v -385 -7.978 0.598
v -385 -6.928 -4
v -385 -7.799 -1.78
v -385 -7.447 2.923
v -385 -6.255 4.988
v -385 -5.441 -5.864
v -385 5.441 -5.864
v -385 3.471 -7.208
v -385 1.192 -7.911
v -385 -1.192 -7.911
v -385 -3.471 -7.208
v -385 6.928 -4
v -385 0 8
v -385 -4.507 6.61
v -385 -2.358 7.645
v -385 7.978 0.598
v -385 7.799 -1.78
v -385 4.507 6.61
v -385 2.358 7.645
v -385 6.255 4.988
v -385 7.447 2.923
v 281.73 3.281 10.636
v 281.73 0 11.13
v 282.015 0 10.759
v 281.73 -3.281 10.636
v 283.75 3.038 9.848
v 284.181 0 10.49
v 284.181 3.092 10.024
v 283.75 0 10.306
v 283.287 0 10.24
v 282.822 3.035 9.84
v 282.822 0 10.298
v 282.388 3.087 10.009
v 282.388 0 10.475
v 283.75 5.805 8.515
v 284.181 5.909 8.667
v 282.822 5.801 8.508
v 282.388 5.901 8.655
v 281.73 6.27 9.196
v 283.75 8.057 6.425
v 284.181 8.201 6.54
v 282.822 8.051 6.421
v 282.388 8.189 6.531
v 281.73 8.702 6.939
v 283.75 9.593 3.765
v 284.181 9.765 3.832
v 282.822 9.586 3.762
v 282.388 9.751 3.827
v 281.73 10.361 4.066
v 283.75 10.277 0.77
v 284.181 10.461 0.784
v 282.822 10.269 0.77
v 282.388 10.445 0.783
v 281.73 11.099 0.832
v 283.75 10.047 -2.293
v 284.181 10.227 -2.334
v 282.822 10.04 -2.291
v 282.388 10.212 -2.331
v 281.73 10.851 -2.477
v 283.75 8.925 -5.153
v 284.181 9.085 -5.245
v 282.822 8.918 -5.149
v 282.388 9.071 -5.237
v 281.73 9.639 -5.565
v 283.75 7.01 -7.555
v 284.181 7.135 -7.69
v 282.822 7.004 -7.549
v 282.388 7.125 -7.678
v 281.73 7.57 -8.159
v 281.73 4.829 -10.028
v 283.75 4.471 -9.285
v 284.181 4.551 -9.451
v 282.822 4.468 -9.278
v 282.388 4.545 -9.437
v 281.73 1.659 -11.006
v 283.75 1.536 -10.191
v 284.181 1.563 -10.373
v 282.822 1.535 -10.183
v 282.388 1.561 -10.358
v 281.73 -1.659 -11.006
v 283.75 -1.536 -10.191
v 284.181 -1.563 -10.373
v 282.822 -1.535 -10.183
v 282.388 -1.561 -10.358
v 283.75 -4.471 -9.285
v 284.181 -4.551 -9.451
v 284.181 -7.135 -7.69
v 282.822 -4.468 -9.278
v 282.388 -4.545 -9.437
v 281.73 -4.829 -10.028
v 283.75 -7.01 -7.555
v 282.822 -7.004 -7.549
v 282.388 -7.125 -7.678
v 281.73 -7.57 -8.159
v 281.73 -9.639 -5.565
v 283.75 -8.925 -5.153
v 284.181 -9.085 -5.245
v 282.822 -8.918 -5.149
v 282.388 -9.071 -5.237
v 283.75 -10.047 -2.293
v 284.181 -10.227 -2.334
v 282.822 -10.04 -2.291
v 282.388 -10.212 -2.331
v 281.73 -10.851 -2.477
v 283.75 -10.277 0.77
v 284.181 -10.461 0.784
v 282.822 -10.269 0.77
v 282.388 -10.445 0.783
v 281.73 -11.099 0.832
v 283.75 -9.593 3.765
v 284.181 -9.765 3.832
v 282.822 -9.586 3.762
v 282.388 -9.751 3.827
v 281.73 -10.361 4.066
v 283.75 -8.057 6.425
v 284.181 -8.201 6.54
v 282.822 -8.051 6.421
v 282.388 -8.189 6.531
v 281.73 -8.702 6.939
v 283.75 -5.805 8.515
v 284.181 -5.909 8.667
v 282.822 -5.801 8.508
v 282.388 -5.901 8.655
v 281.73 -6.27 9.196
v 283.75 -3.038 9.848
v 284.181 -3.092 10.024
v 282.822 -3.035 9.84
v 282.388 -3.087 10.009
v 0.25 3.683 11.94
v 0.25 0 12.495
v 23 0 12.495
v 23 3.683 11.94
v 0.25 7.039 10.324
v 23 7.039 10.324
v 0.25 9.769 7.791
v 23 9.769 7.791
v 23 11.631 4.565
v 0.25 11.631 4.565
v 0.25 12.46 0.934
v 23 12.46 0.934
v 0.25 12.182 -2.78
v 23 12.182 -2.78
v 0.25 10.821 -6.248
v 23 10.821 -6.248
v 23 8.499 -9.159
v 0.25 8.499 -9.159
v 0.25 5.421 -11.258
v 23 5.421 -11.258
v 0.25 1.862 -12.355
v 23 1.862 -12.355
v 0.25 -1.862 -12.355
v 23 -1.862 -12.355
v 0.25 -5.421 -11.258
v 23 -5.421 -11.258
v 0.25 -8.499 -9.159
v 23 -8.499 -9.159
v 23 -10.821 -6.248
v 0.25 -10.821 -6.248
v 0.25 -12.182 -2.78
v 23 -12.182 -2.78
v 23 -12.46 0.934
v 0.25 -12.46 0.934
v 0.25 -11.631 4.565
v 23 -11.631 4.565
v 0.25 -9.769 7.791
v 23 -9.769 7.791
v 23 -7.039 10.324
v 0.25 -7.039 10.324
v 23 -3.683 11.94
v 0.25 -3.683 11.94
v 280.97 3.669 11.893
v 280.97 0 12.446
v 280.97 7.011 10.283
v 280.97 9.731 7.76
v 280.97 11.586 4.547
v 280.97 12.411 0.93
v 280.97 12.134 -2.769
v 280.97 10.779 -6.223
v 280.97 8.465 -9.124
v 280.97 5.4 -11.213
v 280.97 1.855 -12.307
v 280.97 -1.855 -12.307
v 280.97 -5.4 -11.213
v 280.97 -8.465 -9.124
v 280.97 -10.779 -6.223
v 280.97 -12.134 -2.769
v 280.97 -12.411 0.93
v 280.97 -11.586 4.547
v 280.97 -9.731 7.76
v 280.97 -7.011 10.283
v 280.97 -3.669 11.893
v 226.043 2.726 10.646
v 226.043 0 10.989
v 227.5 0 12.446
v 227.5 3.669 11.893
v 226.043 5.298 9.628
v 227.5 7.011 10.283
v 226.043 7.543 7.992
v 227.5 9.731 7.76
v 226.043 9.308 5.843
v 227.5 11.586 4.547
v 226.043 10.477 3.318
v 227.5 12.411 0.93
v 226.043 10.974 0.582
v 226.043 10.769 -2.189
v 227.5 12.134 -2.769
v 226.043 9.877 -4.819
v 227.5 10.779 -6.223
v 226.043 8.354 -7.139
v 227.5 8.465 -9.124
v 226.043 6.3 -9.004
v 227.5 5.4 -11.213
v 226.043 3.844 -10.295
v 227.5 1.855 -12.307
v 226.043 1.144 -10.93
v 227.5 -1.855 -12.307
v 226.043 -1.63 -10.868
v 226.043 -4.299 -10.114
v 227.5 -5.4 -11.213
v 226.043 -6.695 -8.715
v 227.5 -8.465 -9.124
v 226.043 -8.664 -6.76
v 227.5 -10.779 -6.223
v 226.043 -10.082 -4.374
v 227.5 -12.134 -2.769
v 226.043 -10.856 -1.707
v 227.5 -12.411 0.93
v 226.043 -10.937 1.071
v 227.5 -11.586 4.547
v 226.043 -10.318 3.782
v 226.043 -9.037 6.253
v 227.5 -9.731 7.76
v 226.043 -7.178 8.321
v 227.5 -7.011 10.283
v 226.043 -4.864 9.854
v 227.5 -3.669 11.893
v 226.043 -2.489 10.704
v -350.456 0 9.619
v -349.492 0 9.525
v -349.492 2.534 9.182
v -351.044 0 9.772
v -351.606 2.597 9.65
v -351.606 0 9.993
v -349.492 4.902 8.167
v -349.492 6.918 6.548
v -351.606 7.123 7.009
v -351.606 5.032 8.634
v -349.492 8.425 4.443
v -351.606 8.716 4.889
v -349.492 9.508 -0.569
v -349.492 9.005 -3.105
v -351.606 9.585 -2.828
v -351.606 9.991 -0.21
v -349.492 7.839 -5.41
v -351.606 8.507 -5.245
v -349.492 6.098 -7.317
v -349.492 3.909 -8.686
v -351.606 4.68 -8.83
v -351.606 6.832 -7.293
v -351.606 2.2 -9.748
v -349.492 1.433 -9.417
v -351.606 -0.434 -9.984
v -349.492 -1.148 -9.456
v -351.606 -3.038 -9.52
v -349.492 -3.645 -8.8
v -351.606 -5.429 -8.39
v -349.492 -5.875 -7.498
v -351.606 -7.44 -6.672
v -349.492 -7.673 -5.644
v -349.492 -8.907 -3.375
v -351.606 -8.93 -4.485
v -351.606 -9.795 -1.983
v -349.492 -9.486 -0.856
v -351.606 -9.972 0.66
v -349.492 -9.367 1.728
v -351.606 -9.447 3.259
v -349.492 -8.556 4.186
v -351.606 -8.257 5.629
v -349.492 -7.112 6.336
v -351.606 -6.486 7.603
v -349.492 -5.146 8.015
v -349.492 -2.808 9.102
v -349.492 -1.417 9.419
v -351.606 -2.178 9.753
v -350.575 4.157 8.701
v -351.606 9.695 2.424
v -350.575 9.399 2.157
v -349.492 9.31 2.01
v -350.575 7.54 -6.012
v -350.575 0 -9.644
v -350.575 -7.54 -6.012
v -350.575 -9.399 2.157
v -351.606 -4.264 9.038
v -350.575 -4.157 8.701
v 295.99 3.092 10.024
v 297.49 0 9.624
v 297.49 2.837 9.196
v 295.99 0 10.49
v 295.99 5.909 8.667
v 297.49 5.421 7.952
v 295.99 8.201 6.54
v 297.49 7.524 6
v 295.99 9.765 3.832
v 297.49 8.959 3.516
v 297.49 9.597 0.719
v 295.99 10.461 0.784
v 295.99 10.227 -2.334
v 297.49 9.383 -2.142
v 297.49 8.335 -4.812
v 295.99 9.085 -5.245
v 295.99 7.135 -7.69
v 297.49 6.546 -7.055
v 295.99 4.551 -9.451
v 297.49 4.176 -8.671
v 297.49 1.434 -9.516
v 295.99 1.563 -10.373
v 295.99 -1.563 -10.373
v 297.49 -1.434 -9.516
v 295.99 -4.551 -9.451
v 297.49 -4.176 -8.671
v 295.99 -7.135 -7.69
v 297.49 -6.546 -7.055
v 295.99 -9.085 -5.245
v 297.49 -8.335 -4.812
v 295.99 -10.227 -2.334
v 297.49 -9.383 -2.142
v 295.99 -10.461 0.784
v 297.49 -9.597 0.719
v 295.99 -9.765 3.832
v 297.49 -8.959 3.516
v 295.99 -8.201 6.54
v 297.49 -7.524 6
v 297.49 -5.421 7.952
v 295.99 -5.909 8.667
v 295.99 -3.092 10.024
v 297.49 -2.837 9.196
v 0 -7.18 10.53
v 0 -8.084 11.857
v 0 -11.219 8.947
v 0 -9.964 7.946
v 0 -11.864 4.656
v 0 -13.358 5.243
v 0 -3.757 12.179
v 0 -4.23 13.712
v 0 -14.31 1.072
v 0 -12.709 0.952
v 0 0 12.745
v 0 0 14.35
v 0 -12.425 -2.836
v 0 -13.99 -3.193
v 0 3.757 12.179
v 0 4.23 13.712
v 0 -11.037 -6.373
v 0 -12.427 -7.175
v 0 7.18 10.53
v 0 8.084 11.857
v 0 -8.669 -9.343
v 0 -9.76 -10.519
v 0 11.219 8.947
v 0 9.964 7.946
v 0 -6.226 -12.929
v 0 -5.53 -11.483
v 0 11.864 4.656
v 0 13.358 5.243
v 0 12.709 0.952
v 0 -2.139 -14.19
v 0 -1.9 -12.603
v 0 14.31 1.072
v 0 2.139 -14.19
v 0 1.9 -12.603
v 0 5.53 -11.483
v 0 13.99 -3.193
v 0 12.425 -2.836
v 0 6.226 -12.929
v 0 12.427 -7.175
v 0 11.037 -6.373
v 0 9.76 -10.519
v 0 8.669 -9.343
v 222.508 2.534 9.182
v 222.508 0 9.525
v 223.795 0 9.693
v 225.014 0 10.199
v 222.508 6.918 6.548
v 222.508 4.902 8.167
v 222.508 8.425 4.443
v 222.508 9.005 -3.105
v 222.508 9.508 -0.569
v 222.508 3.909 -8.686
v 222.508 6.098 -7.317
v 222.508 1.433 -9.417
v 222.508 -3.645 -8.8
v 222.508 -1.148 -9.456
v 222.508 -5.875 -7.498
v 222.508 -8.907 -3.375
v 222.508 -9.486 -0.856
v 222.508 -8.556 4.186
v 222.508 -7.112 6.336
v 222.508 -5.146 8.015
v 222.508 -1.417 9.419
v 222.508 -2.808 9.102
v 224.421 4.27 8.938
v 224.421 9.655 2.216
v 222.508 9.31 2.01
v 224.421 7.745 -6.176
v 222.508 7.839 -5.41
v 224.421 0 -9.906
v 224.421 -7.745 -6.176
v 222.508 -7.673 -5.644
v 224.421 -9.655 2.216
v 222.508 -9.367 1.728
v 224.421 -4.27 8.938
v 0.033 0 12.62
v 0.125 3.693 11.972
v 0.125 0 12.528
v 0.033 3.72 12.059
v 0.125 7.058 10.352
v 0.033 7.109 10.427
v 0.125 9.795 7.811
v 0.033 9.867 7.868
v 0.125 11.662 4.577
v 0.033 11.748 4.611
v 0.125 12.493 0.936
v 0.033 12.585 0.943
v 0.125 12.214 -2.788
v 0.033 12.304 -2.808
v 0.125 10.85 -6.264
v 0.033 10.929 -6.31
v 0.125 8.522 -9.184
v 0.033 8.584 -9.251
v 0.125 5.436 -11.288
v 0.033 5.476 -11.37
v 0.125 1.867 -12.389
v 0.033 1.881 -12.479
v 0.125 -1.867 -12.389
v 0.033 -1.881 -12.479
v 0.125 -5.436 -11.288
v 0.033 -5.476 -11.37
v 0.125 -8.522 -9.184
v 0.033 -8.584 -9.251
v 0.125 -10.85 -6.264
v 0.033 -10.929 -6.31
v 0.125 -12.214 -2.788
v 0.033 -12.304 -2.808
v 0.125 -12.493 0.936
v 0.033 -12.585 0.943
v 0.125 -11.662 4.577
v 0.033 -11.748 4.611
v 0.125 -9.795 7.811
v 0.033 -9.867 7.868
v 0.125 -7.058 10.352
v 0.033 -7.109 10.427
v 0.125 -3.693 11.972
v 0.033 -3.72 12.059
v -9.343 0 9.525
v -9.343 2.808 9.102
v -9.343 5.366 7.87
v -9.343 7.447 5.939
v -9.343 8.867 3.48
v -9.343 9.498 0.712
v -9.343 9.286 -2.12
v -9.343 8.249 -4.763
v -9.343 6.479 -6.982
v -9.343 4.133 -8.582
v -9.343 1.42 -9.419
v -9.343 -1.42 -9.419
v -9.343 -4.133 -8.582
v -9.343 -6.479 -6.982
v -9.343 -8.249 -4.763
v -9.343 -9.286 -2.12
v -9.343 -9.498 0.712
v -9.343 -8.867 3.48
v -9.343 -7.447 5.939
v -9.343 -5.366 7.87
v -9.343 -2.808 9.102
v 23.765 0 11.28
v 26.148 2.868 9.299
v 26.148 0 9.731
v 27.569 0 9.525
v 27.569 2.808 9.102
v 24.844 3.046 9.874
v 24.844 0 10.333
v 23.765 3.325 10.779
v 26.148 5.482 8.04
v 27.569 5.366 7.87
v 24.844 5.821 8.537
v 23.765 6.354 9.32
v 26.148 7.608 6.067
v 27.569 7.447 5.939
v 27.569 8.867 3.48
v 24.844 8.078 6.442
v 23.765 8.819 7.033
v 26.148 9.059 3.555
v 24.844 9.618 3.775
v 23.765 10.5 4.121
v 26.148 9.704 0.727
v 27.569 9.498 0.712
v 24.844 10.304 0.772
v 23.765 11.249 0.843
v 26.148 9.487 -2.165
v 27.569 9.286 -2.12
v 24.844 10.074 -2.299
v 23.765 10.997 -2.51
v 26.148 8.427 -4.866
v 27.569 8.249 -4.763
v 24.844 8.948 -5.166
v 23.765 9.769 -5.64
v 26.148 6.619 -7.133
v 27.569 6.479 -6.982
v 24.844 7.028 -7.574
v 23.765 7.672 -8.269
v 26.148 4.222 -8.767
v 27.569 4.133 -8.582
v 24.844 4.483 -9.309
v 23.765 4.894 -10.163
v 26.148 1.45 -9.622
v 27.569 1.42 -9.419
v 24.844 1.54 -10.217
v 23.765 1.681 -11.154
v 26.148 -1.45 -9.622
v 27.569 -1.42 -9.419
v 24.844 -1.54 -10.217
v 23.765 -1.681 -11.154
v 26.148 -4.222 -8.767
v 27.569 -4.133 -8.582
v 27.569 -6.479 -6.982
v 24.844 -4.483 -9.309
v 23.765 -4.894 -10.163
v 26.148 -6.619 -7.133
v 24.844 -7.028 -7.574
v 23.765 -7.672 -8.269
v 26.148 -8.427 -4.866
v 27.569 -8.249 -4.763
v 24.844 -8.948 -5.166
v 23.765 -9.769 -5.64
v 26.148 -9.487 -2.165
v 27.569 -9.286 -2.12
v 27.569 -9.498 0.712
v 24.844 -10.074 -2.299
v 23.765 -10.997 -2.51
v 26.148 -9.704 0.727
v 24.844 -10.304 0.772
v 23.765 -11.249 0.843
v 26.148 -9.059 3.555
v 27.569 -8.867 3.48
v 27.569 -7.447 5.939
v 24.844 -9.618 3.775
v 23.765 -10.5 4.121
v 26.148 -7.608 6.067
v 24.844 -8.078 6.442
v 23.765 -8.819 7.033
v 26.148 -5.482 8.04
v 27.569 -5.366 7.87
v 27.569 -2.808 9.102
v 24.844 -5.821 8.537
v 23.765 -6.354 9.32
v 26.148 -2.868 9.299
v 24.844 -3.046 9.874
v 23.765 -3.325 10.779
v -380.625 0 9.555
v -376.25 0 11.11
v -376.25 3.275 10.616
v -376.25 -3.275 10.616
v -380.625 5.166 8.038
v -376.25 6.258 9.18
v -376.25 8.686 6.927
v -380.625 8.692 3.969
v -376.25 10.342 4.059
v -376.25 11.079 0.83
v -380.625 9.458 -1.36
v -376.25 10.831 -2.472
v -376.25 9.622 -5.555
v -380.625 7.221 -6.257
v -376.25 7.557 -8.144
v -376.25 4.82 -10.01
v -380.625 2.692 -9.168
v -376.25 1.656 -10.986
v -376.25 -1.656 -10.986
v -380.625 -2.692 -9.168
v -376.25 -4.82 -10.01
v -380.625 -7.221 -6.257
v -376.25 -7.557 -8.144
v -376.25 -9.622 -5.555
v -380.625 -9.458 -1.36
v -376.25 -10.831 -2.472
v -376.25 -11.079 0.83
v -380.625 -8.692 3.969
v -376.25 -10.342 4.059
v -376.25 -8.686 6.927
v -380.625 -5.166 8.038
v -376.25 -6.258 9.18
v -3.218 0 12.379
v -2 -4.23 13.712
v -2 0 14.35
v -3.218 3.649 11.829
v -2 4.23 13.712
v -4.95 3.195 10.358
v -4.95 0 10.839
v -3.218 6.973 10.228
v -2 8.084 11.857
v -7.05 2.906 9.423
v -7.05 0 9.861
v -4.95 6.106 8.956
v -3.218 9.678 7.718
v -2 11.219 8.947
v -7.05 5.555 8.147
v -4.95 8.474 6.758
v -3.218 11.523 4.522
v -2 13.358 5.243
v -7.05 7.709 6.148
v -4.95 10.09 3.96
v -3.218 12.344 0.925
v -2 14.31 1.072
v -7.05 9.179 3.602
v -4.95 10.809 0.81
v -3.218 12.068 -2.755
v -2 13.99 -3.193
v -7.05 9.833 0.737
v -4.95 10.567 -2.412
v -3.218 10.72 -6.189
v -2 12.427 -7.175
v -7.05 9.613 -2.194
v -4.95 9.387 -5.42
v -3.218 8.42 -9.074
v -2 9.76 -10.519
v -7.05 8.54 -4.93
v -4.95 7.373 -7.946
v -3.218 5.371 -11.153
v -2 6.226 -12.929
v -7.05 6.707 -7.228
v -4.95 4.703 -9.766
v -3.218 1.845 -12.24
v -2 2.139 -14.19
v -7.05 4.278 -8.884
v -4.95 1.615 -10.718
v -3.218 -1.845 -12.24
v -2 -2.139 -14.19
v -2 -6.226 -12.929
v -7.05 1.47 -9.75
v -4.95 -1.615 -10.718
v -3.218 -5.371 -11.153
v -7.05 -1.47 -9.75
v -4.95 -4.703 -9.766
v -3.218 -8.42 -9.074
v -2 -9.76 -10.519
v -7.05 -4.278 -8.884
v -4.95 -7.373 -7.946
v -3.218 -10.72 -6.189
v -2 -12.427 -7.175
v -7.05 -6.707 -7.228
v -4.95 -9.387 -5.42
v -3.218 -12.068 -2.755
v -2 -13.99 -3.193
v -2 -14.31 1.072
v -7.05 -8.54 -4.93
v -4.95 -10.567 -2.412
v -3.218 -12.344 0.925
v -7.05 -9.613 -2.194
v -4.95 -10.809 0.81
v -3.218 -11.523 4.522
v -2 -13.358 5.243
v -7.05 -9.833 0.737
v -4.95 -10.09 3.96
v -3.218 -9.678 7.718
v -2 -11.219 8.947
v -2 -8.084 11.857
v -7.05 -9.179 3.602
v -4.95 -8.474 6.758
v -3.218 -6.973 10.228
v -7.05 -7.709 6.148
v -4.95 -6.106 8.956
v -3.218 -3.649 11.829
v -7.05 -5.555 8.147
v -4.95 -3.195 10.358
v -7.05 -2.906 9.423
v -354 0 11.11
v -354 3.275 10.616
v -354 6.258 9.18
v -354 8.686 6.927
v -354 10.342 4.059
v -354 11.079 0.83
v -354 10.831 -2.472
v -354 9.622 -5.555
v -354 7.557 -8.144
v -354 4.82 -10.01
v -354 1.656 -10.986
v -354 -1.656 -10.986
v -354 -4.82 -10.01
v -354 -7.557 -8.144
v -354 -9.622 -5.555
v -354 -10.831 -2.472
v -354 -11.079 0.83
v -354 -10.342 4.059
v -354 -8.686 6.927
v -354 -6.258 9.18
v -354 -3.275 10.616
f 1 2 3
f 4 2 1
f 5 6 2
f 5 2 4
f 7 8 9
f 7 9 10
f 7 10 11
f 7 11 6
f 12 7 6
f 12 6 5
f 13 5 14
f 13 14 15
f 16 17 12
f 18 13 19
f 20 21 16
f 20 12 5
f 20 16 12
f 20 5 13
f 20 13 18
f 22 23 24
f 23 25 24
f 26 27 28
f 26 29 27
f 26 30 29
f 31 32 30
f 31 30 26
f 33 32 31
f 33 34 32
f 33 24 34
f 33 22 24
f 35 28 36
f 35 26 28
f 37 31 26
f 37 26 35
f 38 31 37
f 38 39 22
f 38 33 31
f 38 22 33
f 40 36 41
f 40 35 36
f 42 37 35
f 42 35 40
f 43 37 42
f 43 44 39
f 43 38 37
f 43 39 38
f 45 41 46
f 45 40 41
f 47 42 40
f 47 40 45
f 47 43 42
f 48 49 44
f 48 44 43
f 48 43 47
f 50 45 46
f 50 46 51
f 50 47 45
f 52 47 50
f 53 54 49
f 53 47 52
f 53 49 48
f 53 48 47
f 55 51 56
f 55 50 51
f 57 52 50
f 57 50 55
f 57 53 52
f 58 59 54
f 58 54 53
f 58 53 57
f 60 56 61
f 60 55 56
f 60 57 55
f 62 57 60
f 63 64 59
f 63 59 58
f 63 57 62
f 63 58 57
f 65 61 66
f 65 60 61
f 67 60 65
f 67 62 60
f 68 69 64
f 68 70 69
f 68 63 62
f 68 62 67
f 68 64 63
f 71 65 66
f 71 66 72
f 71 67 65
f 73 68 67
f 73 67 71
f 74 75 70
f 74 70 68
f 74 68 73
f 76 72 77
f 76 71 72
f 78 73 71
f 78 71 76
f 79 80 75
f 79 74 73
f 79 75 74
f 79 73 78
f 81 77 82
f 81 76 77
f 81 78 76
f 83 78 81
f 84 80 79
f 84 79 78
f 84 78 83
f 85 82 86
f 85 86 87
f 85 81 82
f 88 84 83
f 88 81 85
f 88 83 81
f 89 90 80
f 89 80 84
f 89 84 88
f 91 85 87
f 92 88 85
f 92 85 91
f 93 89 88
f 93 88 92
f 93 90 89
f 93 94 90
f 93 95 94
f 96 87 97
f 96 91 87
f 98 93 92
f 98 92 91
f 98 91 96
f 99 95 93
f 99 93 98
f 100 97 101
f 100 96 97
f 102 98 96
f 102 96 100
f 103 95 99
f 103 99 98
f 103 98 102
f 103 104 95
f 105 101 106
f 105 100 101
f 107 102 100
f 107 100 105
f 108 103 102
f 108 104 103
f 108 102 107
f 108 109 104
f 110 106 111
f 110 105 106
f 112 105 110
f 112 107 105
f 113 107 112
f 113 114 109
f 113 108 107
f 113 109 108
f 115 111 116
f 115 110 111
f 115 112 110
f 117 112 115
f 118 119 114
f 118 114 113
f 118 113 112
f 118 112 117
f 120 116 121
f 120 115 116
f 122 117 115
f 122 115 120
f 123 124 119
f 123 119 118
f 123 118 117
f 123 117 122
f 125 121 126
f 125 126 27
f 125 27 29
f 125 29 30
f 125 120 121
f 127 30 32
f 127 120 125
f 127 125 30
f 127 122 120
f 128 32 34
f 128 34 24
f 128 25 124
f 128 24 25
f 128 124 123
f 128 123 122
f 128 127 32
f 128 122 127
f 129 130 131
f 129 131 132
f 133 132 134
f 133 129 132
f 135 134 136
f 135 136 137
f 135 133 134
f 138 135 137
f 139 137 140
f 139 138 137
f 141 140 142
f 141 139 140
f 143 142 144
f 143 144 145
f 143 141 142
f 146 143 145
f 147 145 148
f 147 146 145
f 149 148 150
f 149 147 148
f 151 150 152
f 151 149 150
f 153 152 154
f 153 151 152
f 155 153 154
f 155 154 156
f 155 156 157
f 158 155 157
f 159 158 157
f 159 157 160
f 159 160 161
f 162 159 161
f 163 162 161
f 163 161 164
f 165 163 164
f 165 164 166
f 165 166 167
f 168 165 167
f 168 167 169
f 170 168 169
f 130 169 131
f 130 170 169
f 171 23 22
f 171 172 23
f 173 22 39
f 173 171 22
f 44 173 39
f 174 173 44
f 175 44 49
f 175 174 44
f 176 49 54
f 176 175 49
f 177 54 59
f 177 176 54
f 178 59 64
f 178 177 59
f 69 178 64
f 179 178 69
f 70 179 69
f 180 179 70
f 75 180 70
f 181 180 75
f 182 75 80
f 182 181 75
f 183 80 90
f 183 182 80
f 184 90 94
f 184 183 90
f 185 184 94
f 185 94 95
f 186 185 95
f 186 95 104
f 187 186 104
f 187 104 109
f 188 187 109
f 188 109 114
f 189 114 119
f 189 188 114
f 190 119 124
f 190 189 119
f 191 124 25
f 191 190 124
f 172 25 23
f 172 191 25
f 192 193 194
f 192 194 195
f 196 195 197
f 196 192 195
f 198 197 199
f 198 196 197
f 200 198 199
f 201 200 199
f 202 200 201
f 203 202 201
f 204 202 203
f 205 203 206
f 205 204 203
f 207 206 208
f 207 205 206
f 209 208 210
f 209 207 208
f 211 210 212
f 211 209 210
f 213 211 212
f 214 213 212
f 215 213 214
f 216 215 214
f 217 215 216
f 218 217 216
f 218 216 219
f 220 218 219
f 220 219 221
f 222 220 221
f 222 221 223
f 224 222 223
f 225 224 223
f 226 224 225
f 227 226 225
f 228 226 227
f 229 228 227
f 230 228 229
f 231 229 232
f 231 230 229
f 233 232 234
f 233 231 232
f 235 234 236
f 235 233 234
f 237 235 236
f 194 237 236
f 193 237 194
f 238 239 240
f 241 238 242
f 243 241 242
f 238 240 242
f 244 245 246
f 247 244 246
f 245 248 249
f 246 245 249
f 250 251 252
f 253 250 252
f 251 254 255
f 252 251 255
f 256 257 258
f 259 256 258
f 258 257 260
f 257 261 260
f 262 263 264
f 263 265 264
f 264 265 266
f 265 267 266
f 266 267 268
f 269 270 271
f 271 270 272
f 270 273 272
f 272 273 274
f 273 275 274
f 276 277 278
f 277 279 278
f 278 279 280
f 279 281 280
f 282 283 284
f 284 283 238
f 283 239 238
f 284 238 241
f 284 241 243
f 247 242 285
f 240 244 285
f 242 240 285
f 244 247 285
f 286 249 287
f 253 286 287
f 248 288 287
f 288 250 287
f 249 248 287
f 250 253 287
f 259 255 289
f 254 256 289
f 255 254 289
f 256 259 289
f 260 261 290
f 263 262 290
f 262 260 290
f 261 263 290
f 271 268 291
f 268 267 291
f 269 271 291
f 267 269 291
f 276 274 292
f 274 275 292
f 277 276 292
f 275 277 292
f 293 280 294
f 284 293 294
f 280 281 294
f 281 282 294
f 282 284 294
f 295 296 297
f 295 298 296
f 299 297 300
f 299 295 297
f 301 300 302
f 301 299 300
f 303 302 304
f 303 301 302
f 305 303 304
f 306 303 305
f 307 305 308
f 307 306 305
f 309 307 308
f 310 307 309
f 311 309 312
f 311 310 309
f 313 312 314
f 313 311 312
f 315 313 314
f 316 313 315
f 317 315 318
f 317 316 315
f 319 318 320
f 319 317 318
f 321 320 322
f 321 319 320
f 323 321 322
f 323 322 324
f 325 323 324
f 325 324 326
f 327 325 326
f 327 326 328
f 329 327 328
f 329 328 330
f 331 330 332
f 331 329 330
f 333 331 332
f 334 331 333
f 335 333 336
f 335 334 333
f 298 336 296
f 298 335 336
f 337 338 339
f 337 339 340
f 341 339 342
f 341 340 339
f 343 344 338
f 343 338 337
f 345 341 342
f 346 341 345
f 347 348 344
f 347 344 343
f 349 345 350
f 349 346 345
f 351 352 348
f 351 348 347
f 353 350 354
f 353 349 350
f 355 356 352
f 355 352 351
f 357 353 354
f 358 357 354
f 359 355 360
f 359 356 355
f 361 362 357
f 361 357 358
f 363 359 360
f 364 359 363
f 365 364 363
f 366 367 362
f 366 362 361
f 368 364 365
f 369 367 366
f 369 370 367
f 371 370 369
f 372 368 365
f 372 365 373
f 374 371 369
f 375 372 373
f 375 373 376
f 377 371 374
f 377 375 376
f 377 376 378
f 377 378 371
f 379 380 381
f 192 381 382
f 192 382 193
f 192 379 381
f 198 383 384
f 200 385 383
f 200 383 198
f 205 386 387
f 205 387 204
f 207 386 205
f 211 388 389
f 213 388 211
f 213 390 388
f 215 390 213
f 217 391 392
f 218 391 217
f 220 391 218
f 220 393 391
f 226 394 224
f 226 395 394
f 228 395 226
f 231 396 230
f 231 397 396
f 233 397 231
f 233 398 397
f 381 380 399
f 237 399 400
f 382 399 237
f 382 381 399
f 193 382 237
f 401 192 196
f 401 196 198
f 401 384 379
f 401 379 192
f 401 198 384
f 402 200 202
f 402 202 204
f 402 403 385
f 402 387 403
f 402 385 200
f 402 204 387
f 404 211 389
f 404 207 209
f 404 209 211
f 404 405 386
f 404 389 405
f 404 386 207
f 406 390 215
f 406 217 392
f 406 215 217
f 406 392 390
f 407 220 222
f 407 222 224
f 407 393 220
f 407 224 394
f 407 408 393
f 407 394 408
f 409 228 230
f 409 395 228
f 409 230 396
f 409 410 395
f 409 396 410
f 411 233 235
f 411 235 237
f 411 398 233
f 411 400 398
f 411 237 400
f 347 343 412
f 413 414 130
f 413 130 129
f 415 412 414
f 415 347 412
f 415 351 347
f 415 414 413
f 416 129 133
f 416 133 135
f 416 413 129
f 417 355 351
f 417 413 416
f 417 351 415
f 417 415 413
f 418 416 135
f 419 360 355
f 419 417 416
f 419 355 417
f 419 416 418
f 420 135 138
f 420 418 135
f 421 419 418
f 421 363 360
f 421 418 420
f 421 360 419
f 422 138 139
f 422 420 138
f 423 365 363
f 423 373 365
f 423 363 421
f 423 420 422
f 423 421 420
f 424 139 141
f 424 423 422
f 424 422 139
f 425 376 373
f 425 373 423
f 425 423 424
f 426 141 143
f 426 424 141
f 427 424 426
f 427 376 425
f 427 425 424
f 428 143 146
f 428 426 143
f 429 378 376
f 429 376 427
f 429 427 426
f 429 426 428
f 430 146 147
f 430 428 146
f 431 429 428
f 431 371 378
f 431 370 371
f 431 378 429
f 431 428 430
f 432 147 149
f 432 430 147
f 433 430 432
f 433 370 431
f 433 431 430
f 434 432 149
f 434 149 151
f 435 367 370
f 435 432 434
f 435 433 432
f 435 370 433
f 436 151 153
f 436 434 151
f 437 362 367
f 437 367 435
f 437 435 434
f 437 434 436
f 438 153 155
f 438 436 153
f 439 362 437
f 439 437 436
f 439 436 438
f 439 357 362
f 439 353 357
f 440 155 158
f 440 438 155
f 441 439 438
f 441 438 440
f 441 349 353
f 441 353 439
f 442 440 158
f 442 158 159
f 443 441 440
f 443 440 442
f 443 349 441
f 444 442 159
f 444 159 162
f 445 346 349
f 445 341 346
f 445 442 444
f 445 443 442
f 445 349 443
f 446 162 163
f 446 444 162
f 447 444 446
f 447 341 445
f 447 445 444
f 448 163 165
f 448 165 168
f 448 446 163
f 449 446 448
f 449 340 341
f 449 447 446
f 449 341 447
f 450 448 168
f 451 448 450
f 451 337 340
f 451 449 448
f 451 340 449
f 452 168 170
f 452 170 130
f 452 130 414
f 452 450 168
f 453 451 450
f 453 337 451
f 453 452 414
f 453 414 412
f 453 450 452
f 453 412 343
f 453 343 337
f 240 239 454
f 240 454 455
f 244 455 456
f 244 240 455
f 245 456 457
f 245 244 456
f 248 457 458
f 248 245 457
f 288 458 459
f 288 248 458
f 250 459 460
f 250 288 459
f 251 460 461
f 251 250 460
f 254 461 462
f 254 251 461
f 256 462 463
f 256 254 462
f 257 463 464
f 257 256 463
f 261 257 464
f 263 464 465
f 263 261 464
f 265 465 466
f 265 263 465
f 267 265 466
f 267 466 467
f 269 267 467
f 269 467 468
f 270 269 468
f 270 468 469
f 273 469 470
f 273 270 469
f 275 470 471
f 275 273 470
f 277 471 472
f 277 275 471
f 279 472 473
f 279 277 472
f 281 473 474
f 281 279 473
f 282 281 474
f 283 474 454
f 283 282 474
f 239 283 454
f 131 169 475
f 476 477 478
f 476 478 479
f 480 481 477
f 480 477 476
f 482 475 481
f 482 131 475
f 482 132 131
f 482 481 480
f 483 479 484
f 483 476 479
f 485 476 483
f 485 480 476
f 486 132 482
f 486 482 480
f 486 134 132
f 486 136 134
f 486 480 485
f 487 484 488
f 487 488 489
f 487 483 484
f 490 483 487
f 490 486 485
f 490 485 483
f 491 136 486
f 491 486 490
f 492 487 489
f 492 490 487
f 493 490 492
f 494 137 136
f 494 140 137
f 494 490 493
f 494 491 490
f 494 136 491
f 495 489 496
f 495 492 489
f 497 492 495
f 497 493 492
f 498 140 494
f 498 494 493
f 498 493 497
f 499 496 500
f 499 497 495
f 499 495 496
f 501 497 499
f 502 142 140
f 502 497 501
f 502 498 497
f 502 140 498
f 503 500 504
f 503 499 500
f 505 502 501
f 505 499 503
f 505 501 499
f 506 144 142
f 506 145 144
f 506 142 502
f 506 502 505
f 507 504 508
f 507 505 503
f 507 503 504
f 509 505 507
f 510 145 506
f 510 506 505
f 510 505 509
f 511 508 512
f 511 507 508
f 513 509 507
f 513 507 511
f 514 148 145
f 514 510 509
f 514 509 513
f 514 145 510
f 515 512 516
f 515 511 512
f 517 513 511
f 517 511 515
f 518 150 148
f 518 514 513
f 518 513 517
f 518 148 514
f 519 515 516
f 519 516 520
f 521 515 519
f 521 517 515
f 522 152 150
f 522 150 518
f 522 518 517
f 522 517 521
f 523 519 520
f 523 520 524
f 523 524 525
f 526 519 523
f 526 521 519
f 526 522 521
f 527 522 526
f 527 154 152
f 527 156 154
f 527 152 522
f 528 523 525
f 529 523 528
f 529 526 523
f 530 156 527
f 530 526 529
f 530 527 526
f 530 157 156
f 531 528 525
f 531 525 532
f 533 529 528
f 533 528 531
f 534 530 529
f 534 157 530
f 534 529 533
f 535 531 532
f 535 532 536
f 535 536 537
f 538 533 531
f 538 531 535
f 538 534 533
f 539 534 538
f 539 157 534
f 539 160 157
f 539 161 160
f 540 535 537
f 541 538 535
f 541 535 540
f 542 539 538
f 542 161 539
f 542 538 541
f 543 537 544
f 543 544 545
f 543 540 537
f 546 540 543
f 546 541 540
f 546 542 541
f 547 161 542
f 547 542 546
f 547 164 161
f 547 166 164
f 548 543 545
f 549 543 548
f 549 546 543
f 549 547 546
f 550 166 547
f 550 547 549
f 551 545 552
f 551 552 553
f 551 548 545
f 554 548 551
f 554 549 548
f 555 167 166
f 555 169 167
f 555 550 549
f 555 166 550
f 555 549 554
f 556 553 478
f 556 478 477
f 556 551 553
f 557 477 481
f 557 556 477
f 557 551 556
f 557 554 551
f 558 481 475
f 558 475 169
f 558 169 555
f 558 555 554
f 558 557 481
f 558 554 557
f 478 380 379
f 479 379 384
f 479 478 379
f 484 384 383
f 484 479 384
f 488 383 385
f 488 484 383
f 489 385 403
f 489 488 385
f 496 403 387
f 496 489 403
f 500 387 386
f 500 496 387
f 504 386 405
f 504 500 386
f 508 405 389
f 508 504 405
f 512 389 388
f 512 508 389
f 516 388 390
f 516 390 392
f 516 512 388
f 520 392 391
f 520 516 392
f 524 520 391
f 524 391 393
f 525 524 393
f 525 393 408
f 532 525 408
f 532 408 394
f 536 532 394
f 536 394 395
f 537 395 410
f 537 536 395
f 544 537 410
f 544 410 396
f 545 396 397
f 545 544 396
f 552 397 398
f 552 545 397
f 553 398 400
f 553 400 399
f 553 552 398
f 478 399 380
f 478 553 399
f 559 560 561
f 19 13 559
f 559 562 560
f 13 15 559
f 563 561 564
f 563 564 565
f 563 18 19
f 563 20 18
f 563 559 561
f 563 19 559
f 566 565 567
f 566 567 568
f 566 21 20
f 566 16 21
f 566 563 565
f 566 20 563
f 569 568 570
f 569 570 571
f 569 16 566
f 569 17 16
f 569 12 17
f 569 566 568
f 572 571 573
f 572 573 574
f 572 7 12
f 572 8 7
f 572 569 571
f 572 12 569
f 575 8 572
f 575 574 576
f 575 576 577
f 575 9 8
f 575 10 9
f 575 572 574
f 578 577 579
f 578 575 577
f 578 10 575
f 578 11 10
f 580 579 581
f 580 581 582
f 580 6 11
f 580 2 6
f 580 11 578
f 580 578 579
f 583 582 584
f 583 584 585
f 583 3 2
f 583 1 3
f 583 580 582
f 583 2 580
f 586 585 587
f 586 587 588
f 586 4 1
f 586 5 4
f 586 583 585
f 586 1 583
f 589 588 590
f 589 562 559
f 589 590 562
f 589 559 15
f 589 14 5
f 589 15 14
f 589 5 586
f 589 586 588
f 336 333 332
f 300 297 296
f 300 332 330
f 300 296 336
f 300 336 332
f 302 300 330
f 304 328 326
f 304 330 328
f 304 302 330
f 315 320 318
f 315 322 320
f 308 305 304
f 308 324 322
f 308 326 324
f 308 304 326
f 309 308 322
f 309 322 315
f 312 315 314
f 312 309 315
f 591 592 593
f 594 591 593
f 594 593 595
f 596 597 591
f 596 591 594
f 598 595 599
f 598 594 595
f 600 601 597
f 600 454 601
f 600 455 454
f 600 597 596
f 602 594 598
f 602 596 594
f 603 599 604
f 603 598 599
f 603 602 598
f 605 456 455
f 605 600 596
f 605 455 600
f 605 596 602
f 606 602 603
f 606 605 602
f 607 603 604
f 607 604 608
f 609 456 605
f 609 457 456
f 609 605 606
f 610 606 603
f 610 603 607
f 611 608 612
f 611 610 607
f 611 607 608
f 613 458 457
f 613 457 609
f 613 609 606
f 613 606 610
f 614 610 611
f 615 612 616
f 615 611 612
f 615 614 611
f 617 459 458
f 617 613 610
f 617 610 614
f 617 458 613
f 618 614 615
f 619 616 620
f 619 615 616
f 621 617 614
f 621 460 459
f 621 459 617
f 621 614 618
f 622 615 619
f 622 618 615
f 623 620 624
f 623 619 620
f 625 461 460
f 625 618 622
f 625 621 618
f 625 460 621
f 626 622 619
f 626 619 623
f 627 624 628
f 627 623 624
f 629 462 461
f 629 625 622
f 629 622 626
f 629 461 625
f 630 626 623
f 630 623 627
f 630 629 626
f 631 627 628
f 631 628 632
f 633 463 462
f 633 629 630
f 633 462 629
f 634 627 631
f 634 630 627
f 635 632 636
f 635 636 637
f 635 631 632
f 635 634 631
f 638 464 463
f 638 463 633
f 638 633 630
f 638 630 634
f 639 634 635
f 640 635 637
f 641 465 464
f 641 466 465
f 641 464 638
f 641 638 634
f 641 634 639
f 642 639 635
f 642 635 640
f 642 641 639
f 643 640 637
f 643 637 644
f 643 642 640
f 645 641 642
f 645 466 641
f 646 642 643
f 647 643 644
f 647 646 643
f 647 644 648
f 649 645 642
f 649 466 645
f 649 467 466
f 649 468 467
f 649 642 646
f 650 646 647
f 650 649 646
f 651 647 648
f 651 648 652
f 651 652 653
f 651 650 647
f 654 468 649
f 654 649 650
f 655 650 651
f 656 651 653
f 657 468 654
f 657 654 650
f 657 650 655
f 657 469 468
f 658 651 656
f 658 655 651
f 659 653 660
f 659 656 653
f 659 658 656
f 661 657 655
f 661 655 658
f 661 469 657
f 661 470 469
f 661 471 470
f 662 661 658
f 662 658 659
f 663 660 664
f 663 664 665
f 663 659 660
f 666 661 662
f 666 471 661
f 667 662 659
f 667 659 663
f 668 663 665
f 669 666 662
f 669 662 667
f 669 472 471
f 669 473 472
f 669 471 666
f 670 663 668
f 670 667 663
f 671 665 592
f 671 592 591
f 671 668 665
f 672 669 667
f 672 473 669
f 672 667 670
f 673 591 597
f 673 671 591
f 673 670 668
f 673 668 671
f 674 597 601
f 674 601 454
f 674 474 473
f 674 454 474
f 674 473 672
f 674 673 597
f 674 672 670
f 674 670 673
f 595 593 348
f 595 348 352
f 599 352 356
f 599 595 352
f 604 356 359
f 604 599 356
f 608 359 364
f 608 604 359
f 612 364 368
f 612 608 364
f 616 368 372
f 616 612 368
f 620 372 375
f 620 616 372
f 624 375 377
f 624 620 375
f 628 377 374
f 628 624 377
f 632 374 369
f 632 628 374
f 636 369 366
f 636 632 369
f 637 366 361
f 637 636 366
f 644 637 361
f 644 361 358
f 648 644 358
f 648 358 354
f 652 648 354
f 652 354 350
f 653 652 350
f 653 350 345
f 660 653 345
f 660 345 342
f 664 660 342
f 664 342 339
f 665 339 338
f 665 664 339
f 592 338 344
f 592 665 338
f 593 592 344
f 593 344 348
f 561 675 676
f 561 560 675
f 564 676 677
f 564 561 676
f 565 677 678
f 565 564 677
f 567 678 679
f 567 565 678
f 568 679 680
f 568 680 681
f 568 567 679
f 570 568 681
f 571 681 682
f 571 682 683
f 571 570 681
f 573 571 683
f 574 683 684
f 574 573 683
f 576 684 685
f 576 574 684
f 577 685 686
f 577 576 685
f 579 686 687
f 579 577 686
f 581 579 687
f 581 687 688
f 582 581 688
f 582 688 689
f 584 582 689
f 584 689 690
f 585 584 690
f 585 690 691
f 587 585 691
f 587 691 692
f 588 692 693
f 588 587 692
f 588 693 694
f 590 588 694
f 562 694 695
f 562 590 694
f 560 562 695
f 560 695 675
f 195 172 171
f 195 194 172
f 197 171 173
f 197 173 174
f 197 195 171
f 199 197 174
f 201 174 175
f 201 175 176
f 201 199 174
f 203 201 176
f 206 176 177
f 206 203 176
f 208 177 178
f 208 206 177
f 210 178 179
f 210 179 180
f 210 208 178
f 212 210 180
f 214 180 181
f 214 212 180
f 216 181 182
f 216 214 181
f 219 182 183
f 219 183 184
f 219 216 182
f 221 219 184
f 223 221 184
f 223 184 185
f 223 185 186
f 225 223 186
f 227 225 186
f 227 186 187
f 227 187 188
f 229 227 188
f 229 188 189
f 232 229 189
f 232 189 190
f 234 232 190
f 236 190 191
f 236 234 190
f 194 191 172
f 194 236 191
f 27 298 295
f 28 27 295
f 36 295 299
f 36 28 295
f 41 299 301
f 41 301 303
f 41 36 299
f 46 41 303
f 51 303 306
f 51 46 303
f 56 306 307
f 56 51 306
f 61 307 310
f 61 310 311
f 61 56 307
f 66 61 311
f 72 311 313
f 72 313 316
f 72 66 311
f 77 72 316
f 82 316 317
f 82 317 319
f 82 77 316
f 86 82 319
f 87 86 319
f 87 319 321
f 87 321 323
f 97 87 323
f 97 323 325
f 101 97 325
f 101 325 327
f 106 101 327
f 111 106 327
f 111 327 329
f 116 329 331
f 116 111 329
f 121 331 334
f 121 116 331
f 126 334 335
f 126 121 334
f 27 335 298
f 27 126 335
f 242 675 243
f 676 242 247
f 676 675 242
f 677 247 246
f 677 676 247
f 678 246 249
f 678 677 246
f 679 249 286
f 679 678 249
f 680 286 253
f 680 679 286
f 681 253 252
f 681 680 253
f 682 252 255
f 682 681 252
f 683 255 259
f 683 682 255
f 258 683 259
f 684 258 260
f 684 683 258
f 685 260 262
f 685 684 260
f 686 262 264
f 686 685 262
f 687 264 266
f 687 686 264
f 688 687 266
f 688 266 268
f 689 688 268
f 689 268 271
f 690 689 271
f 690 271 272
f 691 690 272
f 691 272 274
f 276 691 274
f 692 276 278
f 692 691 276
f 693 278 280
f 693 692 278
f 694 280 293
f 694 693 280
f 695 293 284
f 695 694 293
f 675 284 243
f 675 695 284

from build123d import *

# Parameters (mm, degrees)
F4_R = 0.25
F5_R = 5
F6_R = 5


# Not quite as in the source:
# - a fillet or chamfer that OpenCascade refuses, or shapes differently, is made with other operations: its cross-section is extruded or revolved along the edge and cut away or added


with BuildPart() as f1:
    # F0 (on Front) → F1 (revolve)
    with BuildSketch(Plane.XZ):
        with BuildLine():
            Line((-2, 9.525), (-350.6009565311, 9.525))
            Line((-350.6009565311, 9.525), (-354, 11.11))
            Line((-354, 11.11), (-376.25, 11.11))
            Line((-376.25, 11.11), (-385, 8))
            Line((-385, 8), (-385, 0))
            Line((-385, 0), (297.49, 0))
            Line((297.49, 0), (297.49, 9.6239745962))
            Line((297.49, 9.6239745962), (295.99, 10.49))
            Line((295.99, 10.49), (284.1809884429, 10.49))
            ThreePointArc((284.1809884429, 10.49), (282.8216403227, 10.297737003), (281.7297929543, 11.13))
            Line((281.7297929543, 11.13), (280.97, 12.446))
            Line((280.97, 12.446), (227.5, 12.446))
            Line((227.5, 12.446), (224.579, 9.525))
            Line((224.579, 9.525), (23, 9.525))
            Line((23, 9.525), (23, 12.495))
            Line((23, 12.495), (0, 12.495))
            Line((0, 12.495), (0, 14.35))
            Line((0, 14.35), (-2, 14.35))
            Line((-2, 14.35), (-2, 9.525))
        make_face()
    revolve(axis=Axis((-43.755, 0, 0), (-1, 0, 0)))

    # F2: fillet of radius 8 on 1 edges, made by hand

    # F2_s1 → F2_t2 (revolve)
    with BuildSketch(Plane.XZ):
        with BuildLine():
            ThreePointArc((-2, 14.35), (-4.9498048155, 10.8391941398), (-9.3429813428, 9.525))
            Line((-9.3429813428, 9.525), (-2, 9.525))
            Line((-2, 9.525), (-2, 14.35))
        make_face()
    revolve(axis=Axis((-2, 0, 0), (-1, 0, 0)))

    # F3: fillet of radius 5 on 1 edges, made by hand

    # F3_s1 → F3_t2 (revolve)
    with BuildSketch(Plane.XZ):
        with BuildLine():
            ThreePointArc((27.5693653826, 9.525), (24.8444800639, 10.3327452367), (23, 12.495))
            Line((23, 12.495), (23, 9.525))
            Line((23, 9.525), (27.5693653826, 9.525))
        make_face()
    revolve(axis=Axis((23, 0, 0), (-1, 0, 0)))

    # F4
    f4_edges = [f1.edges().sort_by_distance(p)[0] for p in [
        (0, 0, -12.495),
    ]]
    fillet(f4_edges, radius=F4_R)

    # F5
    f5_edges = [f1.edges().sort_by_distance(p)[0] for p in [
        (-350.600957, 0, -9.525),
    ]]
    fillet(f5_edges, radius=F5_R)

    # F6
    f6_edges = [f1.edges().sort_by_distance(p)[0] for p in [
        (224.579, 0, -9.525),
    ]]
    fillet(f6_edges, radius=F6_R)


solid = f1.part
